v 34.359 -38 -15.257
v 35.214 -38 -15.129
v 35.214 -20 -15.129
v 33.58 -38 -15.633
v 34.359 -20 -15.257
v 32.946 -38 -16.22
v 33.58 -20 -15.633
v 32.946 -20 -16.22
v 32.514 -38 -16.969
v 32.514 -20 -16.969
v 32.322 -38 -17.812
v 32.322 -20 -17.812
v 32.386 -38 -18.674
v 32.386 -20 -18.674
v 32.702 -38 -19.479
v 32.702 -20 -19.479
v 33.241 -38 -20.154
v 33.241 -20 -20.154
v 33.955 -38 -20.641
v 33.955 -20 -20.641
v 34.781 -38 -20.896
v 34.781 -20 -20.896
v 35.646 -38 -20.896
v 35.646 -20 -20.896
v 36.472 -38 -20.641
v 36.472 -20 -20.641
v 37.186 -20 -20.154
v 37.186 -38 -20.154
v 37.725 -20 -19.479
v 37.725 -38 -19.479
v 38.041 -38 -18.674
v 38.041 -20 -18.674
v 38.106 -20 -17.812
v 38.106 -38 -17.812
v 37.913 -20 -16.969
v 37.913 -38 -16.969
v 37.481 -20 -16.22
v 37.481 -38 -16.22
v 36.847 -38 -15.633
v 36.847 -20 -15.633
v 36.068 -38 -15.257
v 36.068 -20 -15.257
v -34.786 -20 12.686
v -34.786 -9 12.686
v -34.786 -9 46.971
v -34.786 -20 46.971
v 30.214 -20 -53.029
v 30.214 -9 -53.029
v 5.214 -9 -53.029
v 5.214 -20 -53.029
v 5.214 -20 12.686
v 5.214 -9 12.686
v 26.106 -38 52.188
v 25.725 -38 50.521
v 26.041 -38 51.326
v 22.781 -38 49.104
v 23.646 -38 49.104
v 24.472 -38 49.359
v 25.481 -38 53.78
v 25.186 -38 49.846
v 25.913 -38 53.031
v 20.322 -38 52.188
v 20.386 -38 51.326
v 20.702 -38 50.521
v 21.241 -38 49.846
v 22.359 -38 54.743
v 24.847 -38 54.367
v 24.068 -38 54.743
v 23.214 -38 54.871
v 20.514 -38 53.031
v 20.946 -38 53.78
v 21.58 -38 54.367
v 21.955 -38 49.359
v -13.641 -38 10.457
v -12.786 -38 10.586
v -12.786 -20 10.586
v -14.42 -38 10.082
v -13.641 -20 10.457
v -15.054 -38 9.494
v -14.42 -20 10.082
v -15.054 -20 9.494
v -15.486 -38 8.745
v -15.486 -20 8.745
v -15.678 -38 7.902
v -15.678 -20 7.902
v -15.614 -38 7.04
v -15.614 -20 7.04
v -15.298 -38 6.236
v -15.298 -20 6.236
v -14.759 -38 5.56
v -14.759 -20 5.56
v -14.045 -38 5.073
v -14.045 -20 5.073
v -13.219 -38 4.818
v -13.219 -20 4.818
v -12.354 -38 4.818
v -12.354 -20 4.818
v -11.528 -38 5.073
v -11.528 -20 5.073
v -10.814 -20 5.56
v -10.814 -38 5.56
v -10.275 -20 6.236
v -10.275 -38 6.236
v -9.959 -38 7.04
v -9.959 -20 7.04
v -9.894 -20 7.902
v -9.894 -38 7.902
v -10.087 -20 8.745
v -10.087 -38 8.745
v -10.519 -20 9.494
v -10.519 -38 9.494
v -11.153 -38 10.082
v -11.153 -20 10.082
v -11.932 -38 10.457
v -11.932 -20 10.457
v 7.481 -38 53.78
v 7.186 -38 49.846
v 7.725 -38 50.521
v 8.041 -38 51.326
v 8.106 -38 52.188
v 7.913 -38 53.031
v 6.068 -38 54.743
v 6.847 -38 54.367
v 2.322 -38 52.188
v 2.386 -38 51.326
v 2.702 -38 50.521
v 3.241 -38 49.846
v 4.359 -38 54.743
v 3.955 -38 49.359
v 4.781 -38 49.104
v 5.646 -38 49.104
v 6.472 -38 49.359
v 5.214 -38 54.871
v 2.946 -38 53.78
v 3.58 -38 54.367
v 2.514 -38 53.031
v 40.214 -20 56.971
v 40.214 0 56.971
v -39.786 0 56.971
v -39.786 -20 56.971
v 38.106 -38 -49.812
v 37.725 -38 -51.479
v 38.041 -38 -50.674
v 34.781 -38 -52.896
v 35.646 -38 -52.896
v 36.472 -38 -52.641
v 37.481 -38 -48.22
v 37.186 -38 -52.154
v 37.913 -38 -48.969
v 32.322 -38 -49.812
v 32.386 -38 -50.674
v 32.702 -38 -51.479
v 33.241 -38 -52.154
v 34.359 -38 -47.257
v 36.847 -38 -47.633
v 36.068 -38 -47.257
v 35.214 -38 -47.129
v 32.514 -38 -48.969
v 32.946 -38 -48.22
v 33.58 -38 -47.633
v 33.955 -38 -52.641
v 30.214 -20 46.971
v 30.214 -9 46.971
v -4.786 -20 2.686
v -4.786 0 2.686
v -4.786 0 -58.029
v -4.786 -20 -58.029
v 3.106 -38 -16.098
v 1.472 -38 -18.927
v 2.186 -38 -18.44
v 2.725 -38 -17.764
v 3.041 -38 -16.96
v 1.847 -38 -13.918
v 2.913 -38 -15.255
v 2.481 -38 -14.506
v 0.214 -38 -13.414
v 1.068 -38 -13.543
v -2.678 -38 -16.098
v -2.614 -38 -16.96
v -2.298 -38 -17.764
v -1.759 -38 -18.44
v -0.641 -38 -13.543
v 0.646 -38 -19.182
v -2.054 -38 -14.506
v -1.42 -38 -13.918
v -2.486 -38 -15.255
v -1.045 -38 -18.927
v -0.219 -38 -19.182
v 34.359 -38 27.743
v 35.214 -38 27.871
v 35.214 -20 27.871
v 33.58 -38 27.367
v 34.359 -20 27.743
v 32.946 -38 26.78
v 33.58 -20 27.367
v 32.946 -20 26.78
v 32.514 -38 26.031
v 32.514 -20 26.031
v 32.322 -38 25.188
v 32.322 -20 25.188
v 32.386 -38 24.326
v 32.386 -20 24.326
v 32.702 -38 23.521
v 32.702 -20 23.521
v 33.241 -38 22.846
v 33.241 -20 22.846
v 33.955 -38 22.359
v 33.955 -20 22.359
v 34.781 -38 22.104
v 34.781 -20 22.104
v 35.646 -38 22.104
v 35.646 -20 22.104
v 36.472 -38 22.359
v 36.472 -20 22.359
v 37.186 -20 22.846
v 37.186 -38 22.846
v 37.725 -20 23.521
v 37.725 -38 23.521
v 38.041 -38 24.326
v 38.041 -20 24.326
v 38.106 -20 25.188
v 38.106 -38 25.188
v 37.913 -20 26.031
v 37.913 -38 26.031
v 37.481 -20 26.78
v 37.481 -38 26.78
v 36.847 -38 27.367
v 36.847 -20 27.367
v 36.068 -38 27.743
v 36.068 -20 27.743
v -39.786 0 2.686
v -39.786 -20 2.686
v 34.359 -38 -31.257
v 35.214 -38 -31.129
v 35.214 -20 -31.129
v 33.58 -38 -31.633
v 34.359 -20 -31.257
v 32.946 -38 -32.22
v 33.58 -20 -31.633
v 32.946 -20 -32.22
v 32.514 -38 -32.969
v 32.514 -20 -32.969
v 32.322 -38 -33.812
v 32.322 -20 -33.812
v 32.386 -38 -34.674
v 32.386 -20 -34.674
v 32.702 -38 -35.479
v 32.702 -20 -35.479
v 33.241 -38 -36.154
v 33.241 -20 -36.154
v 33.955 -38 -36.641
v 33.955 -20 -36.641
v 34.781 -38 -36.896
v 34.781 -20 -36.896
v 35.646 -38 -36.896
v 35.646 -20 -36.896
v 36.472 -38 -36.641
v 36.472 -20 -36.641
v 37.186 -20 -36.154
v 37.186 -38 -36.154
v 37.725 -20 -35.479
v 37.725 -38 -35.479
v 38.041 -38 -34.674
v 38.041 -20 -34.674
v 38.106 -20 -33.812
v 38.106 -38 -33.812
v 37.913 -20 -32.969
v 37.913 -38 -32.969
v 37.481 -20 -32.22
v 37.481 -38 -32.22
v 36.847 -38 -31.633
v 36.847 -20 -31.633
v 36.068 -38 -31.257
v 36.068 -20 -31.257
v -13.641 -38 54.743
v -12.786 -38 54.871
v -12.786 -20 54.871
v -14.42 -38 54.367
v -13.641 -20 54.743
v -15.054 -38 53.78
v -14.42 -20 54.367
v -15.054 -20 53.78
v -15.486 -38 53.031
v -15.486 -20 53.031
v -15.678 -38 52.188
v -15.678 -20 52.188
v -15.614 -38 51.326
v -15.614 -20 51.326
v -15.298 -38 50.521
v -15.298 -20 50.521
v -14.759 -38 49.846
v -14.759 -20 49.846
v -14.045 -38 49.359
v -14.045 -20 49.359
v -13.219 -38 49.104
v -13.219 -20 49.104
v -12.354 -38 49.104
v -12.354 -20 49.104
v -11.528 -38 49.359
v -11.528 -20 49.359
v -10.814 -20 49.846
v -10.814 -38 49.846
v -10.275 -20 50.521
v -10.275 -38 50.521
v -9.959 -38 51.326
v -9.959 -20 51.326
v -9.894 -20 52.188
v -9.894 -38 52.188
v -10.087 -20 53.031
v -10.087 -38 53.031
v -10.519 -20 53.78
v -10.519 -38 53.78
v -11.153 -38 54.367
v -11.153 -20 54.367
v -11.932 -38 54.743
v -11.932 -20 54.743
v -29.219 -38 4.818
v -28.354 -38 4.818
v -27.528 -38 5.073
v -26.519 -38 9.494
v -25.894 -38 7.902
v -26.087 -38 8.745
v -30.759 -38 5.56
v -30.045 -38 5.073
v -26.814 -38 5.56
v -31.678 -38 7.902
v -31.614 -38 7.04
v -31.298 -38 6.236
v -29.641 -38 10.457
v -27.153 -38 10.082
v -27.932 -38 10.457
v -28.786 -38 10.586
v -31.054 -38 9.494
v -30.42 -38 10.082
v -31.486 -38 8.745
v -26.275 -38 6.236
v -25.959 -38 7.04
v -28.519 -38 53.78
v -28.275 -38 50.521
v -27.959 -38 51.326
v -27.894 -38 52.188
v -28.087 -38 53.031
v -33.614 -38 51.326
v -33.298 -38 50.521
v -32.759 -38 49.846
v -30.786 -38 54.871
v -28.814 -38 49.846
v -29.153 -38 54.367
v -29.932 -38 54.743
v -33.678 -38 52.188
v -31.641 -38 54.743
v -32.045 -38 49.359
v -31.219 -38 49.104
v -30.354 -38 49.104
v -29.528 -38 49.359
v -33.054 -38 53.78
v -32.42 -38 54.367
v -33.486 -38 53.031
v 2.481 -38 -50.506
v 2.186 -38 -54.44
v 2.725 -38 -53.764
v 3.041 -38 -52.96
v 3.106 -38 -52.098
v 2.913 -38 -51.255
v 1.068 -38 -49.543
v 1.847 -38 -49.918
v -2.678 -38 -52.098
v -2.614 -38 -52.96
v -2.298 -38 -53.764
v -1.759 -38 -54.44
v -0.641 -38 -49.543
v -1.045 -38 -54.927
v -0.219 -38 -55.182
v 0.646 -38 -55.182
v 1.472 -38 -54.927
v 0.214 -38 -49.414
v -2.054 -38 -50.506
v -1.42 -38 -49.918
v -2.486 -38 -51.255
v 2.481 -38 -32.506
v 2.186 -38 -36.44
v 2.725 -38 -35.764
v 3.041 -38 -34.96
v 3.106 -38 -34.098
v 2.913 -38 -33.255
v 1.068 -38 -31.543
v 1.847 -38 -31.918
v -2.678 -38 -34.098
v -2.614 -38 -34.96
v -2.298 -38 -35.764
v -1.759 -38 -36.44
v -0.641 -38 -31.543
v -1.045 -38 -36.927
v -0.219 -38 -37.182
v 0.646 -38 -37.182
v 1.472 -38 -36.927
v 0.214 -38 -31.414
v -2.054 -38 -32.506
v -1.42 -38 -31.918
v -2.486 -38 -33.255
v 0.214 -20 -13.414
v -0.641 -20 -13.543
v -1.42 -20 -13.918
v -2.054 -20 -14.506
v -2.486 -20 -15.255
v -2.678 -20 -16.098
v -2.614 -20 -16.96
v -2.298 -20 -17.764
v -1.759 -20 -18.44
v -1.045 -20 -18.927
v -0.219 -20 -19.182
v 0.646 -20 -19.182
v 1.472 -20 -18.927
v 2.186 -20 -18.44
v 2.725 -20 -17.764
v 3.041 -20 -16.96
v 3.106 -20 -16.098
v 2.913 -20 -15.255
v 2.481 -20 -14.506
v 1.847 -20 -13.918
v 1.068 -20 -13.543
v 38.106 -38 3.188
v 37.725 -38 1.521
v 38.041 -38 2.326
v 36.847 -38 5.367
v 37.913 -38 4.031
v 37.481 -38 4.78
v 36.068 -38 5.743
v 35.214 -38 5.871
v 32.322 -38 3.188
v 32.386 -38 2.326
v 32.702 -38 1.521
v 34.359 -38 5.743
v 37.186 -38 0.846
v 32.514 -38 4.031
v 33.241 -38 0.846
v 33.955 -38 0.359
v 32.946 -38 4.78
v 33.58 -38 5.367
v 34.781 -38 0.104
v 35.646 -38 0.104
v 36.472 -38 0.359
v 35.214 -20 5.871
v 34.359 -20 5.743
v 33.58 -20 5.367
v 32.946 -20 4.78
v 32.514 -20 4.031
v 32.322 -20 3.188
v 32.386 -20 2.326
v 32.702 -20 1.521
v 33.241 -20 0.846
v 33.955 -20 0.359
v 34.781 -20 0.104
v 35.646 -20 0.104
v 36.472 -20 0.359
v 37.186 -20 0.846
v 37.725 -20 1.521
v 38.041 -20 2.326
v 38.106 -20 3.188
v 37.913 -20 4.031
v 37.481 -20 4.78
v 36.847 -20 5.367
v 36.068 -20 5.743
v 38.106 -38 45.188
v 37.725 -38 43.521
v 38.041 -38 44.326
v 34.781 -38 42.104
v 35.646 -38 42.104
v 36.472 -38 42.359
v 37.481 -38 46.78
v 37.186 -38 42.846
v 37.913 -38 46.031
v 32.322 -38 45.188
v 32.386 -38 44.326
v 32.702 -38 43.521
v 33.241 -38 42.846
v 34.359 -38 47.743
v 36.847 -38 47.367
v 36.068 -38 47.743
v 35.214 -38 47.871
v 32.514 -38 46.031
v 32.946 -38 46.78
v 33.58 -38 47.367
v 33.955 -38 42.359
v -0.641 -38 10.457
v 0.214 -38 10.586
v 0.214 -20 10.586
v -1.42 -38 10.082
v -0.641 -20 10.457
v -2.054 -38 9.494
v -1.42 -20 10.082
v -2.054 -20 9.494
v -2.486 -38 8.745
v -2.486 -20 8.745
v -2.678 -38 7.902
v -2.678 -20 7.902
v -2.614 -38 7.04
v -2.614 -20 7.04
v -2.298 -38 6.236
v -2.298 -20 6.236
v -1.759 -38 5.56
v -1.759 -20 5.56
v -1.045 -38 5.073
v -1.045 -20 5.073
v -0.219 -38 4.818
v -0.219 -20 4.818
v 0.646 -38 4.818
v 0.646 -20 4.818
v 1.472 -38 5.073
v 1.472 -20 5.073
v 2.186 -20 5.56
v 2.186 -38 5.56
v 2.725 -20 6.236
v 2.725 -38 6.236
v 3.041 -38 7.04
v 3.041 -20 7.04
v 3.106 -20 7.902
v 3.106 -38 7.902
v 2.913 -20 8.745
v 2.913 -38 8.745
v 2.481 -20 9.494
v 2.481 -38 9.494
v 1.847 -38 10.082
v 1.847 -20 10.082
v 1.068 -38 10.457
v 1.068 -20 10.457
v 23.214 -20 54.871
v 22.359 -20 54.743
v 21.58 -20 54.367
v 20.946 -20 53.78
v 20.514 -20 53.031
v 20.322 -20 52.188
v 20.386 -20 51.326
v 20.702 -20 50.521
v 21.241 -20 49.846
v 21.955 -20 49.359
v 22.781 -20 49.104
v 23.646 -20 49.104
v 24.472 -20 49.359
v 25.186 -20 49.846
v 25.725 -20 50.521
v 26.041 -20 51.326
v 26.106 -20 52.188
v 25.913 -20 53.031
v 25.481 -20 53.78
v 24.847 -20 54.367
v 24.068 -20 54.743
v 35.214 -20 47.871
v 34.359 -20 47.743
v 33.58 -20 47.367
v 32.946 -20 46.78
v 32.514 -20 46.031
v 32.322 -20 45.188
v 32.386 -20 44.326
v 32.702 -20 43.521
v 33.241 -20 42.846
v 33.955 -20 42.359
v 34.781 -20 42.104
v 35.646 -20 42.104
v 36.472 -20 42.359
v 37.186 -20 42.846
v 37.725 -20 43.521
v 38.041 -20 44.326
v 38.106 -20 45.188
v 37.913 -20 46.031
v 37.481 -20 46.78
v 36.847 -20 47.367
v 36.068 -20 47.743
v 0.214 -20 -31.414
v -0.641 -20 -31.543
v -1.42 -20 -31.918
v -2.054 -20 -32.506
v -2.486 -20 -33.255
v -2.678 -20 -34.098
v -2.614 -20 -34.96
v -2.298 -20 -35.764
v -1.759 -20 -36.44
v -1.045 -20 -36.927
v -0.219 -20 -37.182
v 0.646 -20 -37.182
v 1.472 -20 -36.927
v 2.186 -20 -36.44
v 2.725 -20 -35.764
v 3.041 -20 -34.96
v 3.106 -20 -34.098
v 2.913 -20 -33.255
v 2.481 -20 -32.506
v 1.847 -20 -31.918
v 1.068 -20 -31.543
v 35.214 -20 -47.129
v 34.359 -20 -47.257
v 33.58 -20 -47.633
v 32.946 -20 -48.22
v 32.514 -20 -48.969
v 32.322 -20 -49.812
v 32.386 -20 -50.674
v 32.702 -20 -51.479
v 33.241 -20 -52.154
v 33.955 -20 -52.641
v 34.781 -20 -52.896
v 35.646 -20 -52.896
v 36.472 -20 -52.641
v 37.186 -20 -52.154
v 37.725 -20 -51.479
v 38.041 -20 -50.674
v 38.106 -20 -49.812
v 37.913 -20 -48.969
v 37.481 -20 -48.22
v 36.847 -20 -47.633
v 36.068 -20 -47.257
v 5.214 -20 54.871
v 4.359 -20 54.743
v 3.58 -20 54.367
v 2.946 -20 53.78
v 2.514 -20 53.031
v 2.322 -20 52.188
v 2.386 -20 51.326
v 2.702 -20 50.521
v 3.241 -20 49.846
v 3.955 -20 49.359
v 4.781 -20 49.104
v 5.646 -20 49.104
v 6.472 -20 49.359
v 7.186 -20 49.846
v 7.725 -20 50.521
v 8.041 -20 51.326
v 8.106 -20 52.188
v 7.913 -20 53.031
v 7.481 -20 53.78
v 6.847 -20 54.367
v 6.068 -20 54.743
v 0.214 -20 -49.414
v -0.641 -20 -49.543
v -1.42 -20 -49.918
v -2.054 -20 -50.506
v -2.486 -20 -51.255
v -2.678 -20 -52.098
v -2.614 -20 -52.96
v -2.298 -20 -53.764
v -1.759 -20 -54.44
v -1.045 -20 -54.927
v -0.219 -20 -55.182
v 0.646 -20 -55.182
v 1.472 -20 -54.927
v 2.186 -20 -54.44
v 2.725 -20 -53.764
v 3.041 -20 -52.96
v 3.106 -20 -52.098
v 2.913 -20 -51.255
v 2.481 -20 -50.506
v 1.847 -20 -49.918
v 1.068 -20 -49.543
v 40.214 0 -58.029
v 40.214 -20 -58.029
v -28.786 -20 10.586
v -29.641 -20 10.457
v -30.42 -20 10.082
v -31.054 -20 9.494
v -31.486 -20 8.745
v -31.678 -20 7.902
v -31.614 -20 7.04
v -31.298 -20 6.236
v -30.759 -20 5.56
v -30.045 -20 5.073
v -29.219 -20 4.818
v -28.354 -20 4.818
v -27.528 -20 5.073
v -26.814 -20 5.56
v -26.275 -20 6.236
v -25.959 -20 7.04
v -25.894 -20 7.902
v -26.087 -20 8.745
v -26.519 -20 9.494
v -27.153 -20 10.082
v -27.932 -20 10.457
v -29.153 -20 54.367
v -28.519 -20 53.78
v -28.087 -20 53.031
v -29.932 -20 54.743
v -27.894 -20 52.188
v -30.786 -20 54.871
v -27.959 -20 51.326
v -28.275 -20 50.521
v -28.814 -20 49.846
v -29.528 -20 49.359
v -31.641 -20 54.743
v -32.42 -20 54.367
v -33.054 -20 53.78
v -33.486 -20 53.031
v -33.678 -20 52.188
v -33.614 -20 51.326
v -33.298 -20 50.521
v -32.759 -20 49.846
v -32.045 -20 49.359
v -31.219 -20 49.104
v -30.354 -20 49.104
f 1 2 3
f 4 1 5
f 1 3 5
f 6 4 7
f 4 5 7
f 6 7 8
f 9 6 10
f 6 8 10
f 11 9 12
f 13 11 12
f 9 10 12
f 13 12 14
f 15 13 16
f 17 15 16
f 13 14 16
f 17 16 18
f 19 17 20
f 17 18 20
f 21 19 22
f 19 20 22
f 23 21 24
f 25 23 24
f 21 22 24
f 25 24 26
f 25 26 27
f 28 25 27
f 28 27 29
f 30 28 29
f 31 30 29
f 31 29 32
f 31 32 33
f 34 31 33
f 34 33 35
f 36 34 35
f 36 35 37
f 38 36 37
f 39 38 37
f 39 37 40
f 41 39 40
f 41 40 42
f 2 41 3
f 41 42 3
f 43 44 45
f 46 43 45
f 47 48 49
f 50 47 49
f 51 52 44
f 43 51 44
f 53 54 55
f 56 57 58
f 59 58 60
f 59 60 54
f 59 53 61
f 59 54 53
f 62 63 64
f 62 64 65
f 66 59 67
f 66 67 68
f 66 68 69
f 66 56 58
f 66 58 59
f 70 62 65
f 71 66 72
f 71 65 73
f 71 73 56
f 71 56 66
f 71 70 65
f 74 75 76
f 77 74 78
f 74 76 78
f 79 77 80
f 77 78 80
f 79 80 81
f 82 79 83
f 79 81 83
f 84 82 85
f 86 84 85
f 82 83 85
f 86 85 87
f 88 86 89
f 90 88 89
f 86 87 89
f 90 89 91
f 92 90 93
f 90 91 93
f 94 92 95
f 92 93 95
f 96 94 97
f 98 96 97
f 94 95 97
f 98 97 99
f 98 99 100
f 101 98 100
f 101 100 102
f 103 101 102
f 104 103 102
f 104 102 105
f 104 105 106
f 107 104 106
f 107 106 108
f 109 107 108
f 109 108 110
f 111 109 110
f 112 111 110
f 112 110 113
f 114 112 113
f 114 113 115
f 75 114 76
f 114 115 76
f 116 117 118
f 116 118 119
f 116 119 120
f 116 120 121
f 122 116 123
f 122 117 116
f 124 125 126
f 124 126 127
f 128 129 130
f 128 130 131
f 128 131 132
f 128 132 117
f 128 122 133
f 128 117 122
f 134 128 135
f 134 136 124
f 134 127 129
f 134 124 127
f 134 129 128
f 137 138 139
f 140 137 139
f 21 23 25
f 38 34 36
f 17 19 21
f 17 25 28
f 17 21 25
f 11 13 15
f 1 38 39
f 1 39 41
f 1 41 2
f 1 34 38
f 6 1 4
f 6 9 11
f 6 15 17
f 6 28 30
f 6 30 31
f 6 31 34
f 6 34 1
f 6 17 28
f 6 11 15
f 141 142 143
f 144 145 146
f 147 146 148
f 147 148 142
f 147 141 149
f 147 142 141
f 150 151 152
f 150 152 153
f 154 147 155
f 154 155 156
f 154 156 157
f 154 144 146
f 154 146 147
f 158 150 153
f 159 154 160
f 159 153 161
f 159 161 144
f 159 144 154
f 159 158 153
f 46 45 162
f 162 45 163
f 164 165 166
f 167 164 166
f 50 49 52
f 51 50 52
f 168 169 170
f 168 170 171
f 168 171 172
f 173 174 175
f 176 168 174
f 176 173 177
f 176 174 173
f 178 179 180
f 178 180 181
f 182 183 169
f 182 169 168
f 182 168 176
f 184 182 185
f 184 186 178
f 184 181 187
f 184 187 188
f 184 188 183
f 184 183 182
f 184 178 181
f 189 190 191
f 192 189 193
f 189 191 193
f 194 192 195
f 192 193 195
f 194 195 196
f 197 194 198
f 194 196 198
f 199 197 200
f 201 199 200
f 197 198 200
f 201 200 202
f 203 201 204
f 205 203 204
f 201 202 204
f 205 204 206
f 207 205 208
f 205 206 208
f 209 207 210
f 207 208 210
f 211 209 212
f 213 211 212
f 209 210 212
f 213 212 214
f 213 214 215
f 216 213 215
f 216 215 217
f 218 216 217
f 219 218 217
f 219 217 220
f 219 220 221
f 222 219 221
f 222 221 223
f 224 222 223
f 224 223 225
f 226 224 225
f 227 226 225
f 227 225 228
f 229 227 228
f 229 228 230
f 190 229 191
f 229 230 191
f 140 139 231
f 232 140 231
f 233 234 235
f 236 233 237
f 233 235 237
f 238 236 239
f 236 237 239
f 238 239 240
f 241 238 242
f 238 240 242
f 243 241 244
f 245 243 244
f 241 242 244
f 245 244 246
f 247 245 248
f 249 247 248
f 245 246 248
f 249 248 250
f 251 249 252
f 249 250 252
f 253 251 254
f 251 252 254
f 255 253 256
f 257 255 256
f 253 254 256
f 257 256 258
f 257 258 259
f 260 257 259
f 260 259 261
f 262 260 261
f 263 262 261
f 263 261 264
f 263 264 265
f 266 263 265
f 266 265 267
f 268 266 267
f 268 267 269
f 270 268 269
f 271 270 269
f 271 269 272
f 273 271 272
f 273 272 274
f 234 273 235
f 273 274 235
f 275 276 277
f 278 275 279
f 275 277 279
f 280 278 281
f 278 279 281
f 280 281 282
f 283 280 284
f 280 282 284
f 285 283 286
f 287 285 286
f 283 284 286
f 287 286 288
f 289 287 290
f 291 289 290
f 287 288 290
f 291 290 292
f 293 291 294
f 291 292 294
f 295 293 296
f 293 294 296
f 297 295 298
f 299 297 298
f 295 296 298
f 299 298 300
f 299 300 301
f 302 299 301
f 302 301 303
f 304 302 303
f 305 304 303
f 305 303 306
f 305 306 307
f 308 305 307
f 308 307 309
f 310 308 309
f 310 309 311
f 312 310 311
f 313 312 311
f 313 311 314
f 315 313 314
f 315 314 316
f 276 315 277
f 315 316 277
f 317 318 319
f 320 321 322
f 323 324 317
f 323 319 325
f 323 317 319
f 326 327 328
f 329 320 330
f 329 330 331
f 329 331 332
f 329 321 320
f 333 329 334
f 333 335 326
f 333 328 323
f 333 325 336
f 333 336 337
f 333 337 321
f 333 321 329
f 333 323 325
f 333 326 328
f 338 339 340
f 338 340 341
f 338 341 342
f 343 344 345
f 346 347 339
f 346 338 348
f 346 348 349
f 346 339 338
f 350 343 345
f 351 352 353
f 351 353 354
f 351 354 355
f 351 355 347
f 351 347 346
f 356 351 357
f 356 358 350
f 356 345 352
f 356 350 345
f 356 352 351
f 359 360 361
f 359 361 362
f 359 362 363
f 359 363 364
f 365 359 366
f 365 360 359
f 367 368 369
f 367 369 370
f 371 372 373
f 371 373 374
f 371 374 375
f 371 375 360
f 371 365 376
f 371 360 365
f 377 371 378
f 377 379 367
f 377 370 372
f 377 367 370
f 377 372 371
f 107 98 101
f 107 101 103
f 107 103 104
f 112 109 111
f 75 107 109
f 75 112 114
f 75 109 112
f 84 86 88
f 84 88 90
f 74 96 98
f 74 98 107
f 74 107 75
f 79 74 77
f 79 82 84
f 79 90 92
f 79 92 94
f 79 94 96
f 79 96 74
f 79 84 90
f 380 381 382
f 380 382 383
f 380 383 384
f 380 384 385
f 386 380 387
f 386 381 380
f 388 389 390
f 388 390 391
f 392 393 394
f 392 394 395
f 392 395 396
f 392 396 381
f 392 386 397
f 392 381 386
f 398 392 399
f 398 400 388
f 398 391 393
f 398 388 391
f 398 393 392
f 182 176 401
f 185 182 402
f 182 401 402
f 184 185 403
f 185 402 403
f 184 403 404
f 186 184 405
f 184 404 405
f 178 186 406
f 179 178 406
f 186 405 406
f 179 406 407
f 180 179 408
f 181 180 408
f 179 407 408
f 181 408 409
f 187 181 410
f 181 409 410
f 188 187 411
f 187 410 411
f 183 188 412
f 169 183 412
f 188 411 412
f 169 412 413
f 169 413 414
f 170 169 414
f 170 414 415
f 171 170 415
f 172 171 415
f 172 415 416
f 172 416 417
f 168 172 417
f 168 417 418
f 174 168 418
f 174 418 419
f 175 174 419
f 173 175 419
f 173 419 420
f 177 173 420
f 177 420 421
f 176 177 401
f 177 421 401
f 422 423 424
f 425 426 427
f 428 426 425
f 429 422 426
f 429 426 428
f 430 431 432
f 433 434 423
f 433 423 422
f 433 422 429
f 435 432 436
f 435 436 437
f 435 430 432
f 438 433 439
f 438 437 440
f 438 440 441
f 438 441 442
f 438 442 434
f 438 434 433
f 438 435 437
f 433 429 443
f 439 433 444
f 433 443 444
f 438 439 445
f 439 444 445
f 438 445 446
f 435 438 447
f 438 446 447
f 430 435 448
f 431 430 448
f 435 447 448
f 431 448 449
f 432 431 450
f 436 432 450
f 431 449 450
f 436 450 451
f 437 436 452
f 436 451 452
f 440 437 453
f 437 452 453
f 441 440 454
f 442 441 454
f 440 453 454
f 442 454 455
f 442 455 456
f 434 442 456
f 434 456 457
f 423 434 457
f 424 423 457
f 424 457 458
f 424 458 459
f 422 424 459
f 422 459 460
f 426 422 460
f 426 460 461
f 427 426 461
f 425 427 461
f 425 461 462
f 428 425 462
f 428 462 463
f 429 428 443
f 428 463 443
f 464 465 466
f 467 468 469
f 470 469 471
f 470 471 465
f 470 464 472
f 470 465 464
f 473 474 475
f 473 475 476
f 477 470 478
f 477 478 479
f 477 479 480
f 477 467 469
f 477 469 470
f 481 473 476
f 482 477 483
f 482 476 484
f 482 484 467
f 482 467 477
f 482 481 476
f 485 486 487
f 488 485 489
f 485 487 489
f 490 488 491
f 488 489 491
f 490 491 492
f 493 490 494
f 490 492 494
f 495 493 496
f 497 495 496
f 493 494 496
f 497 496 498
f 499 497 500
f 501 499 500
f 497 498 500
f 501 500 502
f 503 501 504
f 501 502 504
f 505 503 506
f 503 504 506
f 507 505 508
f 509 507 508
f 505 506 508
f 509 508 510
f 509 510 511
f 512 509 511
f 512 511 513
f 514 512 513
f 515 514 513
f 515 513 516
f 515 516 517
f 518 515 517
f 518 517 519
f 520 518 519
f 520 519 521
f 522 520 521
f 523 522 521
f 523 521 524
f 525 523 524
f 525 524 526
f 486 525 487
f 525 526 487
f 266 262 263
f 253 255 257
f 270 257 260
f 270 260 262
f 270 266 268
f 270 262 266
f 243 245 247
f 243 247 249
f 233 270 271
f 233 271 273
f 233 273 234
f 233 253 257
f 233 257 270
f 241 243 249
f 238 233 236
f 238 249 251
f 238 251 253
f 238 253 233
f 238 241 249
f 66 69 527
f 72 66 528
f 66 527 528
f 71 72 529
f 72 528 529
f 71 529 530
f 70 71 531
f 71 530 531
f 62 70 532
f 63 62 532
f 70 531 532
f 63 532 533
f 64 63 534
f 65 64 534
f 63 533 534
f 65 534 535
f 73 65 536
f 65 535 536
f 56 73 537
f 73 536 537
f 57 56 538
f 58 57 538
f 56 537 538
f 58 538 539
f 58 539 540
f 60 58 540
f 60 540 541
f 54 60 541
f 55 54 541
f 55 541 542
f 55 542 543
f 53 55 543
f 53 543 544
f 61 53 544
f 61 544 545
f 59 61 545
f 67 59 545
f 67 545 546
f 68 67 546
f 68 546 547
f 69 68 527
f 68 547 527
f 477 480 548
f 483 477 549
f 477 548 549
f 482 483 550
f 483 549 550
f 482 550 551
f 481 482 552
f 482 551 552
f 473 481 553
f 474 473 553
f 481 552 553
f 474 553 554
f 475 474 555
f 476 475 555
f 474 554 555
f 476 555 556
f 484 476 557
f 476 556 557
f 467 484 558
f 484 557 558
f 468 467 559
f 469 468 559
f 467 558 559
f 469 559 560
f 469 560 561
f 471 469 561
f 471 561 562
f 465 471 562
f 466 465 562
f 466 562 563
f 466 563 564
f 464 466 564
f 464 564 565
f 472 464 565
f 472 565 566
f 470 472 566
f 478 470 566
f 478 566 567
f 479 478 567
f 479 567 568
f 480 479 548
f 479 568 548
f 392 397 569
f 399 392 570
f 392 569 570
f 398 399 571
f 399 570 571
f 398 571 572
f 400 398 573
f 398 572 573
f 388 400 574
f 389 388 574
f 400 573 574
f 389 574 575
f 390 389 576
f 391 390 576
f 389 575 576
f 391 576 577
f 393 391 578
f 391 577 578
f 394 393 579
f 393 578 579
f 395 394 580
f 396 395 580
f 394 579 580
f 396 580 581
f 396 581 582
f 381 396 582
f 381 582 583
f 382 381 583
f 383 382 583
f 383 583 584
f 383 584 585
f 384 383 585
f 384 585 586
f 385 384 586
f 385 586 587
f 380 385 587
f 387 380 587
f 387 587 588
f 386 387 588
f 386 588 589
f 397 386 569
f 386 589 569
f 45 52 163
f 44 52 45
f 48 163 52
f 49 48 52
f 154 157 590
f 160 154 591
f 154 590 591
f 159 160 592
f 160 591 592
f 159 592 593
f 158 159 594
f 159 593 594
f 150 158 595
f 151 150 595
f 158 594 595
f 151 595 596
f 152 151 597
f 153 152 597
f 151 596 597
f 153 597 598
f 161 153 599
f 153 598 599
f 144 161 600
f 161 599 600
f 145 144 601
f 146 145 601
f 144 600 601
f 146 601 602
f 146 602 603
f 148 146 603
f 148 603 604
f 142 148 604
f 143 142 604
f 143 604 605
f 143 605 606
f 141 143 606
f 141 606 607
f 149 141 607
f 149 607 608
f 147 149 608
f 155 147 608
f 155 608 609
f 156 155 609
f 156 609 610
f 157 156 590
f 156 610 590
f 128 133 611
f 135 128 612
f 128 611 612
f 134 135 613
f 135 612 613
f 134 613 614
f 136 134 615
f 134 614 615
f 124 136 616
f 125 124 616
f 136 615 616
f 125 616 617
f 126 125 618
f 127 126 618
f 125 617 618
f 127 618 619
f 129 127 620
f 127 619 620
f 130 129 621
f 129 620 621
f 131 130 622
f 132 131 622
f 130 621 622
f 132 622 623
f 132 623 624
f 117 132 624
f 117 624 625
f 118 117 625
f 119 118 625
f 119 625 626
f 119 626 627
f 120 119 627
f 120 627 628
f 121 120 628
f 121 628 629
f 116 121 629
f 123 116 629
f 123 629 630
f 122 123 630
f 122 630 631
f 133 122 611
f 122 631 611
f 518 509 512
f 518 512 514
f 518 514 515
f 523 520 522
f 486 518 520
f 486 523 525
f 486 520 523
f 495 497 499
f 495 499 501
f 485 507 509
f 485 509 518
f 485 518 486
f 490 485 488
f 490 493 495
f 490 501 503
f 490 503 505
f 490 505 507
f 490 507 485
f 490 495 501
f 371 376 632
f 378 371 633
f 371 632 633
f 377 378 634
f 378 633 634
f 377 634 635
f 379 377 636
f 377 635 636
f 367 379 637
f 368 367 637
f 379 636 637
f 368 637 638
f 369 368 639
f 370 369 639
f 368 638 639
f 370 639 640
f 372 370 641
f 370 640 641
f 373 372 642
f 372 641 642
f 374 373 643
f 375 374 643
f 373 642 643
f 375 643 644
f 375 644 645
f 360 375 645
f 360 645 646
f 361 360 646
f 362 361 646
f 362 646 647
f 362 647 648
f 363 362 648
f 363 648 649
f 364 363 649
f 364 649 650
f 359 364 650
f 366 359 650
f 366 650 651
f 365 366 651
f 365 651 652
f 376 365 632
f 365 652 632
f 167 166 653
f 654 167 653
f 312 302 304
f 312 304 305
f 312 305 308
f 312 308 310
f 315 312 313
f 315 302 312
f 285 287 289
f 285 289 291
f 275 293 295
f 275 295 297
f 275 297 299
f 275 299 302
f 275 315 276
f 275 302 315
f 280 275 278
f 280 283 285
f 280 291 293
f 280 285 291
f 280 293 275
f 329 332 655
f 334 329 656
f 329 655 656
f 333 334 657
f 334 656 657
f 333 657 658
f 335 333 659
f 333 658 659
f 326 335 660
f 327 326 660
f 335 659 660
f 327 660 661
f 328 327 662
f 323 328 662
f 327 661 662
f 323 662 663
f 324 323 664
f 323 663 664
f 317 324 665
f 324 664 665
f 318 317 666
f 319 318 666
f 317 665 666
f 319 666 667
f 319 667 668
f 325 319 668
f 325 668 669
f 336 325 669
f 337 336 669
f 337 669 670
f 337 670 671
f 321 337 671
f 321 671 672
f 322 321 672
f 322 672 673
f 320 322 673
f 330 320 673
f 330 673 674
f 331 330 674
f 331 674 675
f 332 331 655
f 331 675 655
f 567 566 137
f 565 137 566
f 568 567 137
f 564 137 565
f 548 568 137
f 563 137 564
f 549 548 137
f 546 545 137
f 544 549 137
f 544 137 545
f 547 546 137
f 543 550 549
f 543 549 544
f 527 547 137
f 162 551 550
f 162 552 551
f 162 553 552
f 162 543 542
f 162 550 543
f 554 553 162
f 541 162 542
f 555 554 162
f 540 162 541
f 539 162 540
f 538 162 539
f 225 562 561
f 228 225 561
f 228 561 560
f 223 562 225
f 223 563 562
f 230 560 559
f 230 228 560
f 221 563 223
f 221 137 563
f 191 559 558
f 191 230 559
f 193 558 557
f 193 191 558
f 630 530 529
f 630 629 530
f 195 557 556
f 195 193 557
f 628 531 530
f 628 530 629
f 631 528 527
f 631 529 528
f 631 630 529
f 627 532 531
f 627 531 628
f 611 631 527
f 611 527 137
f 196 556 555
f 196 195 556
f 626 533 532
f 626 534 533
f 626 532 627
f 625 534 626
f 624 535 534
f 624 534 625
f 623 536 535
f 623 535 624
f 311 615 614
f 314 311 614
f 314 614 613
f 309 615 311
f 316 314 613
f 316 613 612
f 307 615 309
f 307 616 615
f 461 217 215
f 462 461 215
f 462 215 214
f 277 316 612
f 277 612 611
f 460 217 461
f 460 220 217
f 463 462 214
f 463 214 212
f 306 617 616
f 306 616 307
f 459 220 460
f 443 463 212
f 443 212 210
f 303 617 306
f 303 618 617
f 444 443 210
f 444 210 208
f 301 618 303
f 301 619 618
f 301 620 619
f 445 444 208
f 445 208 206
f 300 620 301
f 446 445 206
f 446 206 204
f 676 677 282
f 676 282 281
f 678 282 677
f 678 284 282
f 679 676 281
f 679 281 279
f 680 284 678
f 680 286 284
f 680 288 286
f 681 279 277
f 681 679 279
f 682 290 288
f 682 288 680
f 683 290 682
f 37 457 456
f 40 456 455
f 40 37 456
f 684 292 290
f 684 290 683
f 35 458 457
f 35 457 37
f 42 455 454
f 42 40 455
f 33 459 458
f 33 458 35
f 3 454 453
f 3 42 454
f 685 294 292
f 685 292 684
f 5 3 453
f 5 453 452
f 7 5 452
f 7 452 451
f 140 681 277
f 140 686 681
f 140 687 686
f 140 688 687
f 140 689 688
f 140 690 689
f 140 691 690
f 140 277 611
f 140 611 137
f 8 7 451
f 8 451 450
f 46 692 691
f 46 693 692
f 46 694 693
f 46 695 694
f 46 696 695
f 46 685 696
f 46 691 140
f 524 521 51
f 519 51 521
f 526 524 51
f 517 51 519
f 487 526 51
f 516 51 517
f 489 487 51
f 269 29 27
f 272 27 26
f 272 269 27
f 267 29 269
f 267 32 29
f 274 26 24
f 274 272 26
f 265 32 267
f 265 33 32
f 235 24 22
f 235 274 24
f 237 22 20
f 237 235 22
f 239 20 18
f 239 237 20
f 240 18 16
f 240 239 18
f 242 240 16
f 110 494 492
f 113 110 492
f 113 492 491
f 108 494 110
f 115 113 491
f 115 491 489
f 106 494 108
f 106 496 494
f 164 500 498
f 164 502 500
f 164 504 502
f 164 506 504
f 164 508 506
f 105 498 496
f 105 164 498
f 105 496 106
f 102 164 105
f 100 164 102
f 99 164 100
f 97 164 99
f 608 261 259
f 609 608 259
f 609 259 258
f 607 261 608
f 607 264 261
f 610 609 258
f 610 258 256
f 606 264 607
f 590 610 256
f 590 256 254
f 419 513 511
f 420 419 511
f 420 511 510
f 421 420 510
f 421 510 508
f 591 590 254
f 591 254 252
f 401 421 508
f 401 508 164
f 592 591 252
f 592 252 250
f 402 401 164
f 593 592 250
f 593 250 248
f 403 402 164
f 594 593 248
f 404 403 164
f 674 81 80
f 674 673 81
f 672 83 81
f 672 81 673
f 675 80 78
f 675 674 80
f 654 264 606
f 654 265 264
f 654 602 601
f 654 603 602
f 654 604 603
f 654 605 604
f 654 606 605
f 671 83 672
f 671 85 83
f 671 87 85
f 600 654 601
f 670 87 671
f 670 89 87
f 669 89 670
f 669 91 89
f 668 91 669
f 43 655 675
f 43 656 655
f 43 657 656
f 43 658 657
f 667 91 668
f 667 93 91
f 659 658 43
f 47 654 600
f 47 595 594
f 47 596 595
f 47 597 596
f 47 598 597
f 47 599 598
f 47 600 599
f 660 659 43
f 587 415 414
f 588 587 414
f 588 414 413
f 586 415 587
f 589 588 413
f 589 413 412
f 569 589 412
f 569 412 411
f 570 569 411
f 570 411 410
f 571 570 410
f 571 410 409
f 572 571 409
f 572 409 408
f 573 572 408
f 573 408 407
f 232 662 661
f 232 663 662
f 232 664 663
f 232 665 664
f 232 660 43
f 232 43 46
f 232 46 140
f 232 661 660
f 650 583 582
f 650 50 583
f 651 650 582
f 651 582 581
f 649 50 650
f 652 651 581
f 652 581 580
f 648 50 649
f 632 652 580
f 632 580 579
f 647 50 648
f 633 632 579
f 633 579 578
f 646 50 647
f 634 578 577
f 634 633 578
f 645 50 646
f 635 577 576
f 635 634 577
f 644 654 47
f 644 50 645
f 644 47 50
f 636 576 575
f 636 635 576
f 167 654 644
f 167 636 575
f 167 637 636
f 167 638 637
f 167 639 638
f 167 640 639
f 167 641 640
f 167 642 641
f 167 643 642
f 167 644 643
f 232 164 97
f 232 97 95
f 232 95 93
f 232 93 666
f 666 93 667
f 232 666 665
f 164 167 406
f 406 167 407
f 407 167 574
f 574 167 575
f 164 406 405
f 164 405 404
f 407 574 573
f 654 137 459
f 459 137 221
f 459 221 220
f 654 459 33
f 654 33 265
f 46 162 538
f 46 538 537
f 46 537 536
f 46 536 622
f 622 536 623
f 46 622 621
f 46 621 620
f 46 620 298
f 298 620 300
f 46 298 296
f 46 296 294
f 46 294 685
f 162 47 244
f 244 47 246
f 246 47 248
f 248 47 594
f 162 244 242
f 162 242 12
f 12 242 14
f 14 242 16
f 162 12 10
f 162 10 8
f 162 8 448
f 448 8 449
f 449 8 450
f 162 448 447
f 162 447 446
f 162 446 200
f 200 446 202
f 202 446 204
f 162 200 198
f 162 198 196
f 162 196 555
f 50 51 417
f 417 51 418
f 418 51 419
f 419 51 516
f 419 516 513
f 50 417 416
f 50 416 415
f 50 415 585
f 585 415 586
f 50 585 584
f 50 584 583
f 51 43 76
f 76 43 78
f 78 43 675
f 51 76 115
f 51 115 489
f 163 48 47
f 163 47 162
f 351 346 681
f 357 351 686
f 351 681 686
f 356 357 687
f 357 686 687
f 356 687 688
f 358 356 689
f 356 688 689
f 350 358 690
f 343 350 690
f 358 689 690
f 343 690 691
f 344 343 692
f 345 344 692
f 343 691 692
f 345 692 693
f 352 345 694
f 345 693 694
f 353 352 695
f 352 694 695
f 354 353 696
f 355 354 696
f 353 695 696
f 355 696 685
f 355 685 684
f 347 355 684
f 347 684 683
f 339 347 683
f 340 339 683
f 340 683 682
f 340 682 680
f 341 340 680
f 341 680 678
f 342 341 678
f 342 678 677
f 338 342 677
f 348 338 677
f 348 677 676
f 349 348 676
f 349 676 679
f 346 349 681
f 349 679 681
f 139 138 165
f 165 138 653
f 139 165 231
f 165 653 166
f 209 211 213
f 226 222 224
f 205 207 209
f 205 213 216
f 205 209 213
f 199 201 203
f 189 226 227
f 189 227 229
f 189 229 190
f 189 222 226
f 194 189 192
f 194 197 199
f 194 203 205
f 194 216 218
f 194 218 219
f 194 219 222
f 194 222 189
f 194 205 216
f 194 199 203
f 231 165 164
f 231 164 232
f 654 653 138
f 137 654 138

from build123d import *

# Parameters (mm, degrees)
EXTRUDE_1_DEPTH = 20
EXTRUDE_2_DEPTH = 9
SKETCH_4_R      = 2.9
EXTRUDE_3_DEPTH = 18


with BuildPart() as part:
    # Эскиз2 → Бобышка-Вытянуть1 (new body)
    with BuildSketch(Plane(origin=(0, 0, 0), x_dir=(1, 0, 0), z_dir=(0, 1, 0))):
        Polygon((-30.778265169, -2.685665469), (-4.786347208, -2.685665469), (-4.786347208, 58.028620245), (40.213652792, 58.028620245), (40.213652792, -56.971379755), (-39.786347208, -56.971379755), (-39.786347208, -2.685665469), align=None)
        Polygon((-34.786347208, -46.971379755), (30.213652792, -46.971379755), (30.213652792, -6.971379755), (30.213652792, 53.028620245), (5.213652792, 53.028620245), (5.213652792, -12.685665469), (-34.786347208, -12.685665469), align=None, mode=Mode.SUBTRACT)
    extrude(amount=-EXTRUDE_1_DEPTH)

    # Эскиз3 → Бобышка-Вытянуть2 (add)
    with BuildSketch(Plane(origin=(0, 0, 0), x_dir=(1, 0, 0), z_dir=(0, 1, 0))):
        Polygon((5.213652792, 53.028620245), (30.213652792, 53.028620245), (30.213652792, -46.971379755), (-34.786347208, -46.971379755), (-34.786347208, -12.685665469), (5.213652792, -12.685665469), align=None)
    extrude(amount=-EXTRUDE_2_DEPTH)

    # Эскиз4 → Бобышка-Вытянуть3 (add)
    with BuildSketch(Plane.XZ.offset(20)):
        with Locations(Location((35.213652792, 24.971379755, 0), (0, 0, 90))):
            Circle(SKETCH_4_R)
        with Locations(Location((35.213652792, 2.971379755, 0), (0, 0, 90))):
            Circle(SKETCH_4_R)
        with Locations(Location((35.213652792, -18.028620245, 0), (0, 0, 90))):
            Circle(SKETCH_4_R)
        with Locations(Location((35.213652792, -34.028620245, 0), (0, 0, 90))):
            Circle(SKETCH_4_R)
        with Locations(Location((35.213652792, -50.028620245, 0), (0, 0, 90))):
            Circle(SKETCH_4_R)
        with Locations(Location((23.213652792, 51.971379755, 0), (0, 0, 90))):
            Circle(SKETCH_4_R)
        with Locations(Location((5.213652792, 51.971379755, 0), (0, 0, 90))):
            Circle(SKETCH_4_R)
        with Locations(Location((-12.786347208, 51.971379755, 0), (0, 0, 90))):
            Circle(SKETCH_4_R)
        with Locations(Location((-30.786347208, 51.971379755, 0), (0, 0, 90))):
            Circle(SKETCH_4_R)
        with Locations(Location((-28.786347208, 7.685665469, 0), (0, 0, 90))):
            Circle(SKETCH_4_R)
        with Locations(Location((-12.786347208, 7.685665469, 0), (0, 0, 90))):
            Circle(SKETCH_4_R)
        with Locations(Location((0.213652792, -52.314334531, 0), (0, 0, 90))):
            Circle(SKETCH_4_R)
        with Locations(Location((0.213652792, -34.314334531, 0), (0, 0, 90))):
            Circle(SKETCH_4_R)
        with Locations(Location((0.213652792, -16.314334531, 0), (0, 0, 90))):
            Circle(SKETCH_4_R)
        with Locations(Location((35.213652792, 44.971379755, 0), (0, 0, 90))):
            Circle(SKETCH_4_R)
        with Locations(Location((0.213652792, 7.685665469, 0), (0, 0, 90))):
            Circle(SKETCH_4_R)
    extrude(amount=EXTRUDE_3_DEPTH)


solid = part.part
